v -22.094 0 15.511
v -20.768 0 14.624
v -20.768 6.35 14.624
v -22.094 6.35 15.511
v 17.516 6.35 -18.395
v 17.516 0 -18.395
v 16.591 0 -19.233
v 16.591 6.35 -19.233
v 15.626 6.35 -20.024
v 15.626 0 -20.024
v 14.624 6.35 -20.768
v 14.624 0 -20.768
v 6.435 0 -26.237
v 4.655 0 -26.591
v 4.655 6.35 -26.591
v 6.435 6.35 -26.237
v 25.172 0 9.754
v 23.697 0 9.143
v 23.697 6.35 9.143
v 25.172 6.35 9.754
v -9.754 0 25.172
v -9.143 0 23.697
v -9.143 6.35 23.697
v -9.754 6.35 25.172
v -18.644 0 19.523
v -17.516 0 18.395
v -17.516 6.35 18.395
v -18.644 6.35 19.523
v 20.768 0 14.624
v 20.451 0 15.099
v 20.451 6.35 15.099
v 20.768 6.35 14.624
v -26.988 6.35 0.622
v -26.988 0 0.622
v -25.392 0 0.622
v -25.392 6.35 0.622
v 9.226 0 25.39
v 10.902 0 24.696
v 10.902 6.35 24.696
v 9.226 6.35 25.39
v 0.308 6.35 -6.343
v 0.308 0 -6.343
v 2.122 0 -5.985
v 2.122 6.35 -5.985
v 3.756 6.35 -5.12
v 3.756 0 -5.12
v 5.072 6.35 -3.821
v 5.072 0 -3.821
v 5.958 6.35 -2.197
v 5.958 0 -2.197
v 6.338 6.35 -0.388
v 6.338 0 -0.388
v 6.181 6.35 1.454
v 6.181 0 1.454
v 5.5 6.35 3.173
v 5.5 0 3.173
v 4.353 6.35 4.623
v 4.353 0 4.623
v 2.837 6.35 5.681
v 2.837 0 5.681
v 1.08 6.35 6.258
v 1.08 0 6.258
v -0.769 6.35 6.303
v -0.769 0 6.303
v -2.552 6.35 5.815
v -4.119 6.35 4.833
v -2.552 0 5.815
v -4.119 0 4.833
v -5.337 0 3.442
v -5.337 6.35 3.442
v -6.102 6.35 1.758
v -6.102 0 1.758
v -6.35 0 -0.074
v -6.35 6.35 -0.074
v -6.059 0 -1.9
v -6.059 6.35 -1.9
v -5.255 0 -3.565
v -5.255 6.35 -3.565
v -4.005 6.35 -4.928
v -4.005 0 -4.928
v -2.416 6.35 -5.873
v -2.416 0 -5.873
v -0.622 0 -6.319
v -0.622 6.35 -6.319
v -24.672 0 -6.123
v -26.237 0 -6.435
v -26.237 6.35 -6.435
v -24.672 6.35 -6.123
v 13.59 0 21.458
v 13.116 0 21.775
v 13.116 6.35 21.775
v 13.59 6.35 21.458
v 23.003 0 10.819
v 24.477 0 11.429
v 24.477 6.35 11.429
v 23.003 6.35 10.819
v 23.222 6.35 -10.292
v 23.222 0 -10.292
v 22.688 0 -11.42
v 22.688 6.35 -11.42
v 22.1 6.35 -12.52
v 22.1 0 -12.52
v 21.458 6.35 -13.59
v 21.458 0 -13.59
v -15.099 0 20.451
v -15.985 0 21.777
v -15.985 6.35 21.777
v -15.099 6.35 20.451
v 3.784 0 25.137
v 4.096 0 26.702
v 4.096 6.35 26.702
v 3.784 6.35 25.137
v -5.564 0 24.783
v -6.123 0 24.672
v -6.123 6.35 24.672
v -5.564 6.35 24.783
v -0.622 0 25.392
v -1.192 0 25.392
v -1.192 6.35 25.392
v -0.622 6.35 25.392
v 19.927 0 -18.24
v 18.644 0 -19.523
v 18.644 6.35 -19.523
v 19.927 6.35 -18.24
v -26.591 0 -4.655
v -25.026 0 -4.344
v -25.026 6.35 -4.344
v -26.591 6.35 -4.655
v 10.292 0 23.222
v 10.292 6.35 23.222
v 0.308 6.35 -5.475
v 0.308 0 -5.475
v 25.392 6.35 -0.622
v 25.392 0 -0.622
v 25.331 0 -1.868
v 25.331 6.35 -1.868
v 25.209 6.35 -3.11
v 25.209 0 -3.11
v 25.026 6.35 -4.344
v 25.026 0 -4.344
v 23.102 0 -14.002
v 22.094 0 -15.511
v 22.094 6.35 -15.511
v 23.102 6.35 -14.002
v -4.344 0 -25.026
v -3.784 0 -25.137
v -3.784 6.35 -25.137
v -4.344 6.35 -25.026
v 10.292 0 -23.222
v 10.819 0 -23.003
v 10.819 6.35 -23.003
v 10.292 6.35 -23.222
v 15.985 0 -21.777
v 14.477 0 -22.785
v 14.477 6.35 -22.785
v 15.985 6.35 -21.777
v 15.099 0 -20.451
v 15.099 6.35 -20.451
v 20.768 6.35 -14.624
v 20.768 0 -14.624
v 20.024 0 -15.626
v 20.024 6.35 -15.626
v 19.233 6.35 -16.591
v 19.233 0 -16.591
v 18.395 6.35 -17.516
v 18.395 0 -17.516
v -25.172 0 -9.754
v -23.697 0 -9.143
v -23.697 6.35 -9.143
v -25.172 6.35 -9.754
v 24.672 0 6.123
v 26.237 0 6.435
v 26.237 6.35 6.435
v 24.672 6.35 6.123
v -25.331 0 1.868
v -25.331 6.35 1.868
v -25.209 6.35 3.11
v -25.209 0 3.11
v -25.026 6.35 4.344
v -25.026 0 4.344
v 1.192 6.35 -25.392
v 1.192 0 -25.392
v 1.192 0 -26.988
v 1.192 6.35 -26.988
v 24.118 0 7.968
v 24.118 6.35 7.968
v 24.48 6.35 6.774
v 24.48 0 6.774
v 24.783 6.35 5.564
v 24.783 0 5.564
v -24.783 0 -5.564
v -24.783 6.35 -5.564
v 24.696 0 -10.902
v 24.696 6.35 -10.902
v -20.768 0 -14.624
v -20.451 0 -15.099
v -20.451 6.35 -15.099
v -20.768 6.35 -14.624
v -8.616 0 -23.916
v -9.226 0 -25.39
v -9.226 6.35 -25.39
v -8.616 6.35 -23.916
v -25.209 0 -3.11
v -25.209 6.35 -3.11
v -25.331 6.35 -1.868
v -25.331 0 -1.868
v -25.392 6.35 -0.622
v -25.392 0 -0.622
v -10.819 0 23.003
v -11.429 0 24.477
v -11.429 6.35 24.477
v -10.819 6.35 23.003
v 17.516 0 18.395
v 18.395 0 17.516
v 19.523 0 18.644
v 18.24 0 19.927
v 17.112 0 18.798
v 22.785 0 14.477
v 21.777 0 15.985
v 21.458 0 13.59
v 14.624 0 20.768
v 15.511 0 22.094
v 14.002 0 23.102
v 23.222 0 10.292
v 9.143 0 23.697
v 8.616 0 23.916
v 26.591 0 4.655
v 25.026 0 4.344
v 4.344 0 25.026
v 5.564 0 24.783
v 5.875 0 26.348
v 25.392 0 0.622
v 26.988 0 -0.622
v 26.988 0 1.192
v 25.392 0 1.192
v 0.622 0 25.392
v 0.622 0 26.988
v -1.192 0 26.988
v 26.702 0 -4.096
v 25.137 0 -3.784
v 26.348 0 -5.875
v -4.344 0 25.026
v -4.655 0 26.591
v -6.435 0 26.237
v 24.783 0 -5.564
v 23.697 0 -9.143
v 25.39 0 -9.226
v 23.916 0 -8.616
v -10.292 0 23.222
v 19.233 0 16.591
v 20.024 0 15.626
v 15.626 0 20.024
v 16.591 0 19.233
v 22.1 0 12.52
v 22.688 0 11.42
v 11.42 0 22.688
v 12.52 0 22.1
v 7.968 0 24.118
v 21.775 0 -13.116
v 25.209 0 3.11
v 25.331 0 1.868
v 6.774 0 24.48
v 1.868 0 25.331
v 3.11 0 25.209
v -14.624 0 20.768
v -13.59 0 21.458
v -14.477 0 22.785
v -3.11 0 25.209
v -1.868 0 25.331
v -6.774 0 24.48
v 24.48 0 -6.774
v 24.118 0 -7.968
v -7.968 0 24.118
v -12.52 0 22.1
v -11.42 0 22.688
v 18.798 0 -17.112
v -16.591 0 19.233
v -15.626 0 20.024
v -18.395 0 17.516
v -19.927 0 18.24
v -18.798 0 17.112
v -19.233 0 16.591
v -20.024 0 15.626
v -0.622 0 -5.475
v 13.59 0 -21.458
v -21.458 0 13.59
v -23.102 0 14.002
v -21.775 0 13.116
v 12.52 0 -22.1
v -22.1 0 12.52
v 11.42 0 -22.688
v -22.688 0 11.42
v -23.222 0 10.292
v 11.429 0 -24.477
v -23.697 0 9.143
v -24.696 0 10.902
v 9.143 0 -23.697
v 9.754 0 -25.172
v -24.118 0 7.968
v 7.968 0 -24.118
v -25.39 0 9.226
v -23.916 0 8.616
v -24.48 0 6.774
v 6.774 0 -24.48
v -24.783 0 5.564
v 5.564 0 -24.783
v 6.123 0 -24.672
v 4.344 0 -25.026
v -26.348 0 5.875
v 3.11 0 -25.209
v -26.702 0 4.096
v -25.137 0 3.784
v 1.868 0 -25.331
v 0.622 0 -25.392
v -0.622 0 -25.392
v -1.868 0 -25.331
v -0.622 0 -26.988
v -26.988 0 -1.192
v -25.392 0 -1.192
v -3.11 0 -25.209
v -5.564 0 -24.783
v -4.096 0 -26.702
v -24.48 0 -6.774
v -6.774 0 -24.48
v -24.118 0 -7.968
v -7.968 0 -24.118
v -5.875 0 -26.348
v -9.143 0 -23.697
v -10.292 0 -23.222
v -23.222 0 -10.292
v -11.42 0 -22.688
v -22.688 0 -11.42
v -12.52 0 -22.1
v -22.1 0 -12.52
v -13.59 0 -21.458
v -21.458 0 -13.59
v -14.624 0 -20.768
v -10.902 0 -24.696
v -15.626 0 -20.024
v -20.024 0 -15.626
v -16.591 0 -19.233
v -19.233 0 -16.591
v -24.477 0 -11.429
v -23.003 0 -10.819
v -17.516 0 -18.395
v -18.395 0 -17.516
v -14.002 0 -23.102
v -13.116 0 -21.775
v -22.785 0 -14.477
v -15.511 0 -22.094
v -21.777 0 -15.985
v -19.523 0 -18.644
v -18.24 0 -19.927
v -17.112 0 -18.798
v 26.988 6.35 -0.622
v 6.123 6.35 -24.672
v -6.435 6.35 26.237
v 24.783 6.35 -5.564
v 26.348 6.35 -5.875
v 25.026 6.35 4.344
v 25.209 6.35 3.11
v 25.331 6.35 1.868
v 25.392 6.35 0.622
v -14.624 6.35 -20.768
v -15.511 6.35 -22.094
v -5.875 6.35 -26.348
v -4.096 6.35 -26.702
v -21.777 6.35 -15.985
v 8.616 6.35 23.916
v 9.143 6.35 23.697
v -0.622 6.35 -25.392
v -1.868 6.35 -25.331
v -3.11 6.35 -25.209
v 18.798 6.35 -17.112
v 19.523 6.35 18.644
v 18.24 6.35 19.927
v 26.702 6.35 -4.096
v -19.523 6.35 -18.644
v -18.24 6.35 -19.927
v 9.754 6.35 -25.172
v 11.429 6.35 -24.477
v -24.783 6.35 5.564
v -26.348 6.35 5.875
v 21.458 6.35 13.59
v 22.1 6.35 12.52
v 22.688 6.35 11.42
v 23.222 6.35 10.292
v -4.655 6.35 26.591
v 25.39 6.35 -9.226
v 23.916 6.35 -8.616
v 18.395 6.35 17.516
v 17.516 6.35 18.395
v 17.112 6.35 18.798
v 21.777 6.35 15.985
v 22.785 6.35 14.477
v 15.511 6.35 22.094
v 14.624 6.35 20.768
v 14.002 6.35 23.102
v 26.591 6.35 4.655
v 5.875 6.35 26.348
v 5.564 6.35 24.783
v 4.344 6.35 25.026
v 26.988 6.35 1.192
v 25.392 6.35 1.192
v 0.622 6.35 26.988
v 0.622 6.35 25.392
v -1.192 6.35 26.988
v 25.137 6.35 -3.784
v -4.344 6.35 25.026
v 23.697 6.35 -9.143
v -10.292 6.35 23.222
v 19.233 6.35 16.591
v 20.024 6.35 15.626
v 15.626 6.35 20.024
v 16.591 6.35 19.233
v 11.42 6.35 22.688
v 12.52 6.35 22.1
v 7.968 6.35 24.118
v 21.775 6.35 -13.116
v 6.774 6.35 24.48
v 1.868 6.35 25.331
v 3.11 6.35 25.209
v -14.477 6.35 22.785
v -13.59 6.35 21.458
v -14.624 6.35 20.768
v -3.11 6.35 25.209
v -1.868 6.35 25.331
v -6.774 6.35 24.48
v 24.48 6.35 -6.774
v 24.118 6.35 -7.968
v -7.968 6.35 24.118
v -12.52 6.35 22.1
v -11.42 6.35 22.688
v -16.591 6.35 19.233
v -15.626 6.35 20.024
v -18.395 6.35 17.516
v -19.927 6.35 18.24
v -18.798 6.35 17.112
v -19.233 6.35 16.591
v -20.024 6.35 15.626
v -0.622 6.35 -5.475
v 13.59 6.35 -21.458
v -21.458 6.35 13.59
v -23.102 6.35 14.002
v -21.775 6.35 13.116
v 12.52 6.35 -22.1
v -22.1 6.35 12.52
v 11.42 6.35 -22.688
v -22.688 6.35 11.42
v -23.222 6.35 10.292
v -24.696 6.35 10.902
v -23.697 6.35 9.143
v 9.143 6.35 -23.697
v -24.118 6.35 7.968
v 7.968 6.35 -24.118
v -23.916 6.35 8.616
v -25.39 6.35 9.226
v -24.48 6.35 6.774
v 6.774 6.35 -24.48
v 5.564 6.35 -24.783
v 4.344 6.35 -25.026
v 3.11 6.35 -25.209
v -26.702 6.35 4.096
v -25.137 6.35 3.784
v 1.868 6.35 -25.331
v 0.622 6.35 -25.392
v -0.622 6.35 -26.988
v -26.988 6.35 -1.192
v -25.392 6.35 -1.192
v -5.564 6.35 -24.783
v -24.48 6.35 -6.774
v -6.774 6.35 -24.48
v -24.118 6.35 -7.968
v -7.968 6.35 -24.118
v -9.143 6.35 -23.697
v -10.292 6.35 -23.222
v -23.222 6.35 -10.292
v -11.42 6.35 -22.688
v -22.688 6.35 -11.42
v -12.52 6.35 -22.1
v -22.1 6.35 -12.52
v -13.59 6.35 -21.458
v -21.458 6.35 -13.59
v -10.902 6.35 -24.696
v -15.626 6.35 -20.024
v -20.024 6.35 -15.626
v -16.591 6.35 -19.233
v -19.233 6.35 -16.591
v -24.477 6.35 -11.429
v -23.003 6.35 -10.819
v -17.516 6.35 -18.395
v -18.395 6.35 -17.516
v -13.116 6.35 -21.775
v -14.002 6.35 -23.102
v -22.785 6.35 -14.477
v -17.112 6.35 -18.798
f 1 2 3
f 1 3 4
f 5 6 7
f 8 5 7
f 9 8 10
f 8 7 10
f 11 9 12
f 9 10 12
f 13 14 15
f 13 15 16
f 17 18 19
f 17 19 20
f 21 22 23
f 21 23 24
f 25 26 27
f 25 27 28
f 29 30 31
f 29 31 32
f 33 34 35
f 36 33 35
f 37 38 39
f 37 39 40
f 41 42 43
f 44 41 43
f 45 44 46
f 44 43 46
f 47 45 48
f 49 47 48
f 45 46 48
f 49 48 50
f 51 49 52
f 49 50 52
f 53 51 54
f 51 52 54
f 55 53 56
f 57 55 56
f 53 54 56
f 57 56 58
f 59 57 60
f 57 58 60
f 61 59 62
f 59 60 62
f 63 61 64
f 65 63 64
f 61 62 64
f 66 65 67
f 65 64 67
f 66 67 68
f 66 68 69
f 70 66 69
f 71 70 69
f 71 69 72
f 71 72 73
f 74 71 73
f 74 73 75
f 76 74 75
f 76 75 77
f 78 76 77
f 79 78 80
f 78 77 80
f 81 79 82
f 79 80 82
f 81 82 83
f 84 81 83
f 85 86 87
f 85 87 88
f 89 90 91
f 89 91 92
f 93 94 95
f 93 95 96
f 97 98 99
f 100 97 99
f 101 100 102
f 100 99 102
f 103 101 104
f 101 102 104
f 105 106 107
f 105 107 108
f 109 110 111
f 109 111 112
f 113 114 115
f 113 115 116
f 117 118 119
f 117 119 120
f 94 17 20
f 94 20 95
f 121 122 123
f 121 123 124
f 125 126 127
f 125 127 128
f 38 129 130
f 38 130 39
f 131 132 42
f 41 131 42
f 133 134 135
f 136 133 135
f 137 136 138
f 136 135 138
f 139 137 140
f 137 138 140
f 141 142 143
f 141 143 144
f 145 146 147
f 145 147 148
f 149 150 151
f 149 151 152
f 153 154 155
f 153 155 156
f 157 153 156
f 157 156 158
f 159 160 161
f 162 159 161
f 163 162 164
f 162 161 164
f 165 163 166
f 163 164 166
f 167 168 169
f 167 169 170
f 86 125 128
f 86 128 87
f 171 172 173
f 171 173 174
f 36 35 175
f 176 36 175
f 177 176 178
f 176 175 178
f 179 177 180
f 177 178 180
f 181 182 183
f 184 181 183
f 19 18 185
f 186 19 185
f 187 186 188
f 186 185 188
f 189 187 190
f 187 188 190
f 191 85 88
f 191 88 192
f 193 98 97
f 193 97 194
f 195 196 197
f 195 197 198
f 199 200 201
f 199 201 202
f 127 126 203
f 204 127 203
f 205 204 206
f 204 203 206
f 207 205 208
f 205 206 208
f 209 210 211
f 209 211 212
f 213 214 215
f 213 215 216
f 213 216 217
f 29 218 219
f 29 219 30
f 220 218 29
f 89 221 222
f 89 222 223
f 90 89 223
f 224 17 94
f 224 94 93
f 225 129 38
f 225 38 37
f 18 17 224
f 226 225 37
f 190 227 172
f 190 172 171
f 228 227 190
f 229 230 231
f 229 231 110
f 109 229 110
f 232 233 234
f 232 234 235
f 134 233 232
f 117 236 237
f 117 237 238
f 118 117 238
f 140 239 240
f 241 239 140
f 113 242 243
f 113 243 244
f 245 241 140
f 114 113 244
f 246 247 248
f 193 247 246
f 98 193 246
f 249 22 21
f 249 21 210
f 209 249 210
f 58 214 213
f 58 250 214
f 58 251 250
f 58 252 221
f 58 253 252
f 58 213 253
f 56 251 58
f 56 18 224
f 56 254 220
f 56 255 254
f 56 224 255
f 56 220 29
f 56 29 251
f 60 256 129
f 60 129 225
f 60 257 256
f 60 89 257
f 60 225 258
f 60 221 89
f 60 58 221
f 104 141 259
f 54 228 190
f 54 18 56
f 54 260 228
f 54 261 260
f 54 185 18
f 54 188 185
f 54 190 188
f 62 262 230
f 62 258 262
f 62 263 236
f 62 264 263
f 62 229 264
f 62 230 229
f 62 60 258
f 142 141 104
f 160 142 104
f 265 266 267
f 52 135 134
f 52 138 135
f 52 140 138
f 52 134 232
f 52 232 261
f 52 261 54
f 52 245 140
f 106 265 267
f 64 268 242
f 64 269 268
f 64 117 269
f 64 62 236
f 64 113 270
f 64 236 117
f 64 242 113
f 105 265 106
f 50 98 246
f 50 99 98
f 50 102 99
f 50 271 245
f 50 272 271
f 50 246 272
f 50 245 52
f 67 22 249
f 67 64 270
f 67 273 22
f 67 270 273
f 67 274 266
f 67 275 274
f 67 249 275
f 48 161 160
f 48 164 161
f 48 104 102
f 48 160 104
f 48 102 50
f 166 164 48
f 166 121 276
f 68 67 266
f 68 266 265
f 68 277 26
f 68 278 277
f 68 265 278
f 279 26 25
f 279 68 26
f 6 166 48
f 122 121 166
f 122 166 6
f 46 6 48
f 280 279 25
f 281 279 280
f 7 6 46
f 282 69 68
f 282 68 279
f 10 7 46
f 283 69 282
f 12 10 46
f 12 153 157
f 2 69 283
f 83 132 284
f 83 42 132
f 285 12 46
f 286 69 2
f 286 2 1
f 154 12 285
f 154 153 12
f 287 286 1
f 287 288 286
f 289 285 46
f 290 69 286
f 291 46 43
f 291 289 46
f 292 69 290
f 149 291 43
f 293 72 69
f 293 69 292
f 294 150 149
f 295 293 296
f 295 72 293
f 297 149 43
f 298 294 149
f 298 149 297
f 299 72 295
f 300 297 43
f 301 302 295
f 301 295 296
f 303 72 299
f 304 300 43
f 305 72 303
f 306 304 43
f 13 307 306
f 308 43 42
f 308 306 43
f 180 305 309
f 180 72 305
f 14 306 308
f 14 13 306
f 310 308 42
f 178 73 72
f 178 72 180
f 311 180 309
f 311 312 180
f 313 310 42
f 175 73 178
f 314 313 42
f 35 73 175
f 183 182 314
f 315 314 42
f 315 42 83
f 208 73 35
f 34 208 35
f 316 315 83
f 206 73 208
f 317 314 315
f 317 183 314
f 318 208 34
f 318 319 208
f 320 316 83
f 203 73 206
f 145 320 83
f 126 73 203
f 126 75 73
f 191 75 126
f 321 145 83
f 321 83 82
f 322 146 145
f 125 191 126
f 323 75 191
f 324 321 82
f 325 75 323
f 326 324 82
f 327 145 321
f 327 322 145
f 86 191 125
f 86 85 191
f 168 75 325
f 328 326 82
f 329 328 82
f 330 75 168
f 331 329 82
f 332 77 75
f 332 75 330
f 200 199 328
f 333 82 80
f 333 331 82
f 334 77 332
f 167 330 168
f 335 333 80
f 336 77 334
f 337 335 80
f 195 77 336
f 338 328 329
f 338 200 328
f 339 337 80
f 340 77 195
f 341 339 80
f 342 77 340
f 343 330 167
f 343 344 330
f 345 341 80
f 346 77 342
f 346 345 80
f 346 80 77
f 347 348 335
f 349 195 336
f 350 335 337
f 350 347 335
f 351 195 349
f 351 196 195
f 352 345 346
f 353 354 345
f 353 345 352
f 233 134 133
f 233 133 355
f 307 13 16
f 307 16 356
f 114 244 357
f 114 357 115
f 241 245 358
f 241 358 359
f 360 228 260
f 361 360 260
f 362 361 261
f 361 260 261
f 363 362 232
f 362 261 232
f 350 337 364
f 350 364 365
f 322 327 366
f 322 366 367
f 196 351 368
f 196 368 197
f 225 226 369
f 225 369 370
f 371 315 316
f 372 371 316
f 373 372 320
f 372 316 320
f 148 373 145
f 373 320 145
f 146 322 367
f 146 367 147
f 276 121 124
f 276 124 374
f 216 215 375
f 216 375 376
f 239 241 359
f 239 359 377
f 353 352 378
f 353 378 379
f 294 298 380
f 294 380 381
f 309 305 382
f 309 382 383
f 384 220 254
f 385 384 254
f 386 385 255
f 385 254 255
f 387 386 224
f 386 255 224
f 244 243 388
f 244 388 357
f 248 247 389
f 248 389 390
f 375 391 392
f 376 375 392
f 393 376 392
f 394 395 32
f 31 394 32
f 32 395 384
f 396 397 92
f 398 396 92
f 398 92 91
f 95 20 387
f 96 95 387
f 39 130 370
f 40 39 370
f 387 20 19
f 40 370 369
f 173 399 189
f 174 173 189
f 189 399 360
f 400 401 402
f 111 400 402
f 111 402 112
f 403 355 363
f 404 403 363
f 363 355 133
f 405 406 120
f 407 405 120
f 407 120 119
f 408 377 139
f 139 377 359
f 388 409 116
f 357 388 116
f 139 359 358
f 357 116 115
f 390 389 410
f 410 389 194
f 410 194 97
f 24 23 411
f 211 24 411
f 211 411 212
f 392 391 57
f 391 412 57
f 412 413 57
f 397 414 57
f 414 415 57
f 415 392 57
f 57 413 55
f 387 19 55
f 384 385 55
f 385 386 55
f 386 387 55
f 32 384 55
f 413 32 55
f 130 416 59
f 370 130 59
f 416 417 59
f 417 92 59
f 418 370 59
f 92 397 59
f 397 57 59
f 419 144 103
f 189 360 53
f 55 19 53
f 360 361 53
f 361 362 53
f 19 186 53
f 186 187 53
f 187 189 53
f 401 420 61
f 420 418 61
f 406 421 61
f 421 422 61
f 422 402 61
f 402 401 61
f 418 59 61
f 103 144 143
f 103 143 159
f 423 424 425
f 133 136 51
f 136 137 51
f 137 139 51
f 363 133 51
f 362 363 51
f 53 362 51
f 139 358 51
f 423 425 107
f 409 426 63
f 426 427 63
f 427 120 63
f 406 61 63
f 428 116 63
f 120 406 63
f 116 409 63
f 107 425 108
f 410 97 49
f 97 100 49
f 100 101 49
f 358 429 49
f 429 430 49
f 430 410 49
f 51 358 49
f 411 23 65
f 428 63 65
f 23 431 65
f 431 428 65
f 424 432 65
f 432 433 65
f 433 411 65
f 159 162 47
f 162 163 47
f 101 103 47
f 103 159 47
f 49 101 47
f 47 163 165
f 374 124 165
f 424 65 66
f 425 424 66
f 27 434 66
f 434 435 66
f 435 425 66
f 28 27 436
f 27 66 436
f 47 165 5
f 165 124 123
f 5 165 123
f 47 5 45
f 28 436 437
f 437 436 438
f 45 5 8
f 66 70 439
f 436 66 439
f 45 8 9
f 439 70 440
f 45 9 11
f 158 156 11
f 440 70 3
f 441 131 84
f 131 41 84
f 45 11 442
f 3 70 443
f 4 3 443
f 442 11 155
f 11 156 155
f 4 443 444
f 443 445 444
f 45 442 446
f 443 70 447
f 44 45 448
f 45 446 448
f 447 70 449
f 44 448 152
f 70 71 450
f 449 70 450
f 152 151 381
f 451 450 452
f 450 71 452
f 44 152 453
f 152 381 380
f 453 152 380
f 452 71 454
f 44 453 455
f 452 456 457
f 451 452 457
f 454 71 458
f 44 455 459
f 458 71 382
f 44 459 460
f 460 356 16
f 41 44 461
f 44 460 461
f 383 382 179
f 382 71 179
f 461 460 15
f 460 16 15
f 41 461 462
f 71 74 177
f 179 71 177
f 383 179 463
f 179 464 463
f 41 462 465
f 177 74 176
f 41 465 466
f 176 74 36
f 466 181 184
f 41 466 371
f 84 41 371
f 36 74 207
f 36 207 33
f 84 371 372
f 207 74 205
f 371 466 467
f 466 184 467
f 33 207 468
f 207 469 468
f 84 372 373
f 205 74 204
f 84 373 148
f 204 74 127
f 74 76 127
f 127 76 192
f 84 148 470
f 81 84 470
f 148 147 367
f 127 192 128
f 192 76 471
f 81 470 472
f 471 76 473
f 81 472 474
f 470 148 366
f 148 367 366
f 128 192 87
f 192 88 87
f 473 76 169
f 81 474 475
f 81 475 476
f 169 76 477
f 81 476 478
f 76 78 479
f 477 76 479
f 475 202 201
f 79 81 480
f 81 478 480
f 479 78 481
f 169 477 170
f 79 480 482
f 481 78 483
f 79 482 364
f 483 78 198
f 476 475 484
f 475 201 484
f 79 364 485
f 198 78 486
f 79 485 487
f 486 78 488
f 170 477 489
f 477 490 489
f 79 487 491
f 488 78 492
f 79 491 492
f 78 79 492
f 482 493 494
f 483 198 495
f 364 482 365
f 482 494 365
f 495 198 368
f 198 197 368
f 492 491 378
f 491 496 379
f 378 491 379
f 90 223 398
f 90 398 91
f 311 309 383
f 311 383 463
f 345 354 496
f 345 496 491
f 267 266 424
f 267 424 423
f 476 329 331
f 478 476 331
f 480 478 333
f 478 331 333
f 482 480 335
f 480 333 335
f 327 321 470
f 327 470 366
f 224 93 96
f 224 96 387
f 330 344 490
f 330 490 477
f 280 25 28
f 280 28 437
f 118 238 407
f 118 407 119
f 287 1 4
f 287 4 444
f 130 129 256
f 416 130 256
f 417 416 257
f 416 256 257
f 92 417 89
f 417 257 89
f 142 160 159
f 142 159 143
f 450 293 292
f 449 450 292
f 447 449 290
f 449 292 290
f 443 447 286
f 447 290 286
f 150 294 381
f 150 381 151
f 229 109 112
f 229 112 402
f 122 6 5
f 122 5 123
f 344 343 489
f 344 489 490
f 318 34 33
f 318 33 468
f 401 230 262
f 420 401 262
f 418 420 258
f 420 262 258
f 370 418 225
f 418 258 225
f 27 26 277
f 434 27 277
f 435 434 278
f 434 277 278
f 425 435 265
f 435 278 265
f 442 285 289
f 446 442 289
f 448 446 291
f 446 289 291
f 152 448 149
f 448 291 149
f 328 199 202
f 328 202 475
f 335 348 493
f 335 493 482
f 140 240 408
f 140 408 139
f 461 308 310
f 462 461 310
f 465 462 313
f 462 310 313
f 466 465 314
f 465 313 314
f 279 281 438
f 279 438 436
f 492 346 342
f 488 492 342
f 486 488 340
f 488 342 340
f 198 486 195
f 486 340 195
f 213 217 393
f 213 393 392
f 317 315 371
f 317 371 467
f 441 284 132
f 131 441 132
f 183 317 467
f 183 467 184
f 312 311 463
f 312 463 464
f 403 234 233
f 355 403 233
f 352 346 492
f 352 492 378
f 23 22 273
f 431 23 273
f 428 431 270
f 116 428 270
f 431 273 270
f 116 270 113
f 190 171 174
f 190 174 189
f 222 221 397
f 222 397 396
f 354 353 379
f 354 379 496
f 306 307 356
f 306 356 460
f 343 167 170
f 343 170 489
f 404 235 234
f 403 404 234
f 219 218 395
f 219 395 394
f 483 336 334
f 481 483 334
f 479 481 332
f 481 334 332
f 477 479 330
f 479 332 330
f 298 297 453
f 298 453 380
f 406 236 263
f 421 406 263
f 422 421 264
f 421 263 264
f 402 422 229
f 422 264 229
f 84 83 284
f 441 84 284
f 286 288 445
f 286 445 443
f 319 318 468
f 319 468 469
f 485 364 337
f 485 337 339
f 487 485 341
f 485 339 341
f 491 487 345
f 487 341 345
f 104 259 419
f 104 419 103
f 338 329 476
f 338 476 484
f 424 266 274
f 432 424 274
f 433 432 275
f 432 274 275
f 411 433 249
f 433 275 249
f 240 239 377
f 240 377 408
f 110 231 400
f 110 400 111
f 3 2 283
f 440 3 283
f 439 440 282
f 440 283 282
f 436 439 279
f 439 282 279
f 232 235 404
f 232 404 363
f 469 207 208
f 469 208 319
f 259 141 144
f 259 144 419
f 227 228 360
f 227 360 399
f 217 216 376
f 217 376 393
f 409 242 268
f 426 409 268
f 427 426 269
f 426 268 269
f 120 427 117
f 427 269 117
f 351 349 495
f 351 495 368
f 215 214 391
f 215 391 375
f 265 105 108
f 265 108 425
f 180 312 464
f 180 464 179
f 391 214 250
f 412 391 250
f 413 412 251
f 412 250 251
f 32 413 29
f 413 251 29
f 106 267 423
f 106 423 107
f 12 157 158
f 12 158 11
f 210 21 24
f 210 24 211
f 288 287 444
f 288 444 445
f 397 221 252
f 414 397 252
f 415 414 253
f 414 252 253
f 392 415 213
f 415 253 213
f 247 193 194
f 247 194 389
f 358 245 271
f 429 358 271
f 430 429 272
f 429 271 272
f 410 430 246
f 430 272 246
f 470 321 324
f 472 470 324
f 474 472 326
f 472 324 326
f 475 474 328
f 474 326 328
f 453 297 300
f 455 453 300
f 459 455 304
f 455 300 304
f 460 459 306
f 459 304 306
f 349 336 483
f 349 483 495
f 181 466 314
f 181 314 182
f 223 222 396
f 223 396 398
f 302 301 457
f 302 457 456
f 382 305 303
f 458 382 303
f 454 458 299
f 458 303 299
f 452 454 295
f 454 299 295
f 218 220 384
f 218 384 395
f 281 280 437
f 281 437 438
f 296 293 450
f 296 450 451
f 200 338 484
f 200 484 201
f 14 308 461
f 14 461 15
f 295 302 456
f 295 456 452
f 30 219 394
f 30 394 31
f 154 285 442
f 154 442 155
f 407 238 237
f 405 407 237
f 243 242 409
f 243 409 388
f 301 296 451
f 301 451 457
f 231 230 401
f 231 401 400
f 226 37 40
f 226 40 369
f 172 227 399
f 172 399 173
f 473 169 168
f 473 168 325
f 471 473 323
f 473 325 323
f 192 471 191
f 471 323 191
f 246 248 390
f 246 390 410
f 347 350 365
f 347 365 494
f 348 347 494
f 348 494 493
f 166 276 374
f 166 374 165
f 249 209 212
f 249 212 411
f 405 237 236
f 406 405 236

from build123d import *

# Parameters (mm, degrees)
SKETCH1_R           = 25.4
SKETCH1_W           = 1.814083278
SKETCH1_H           = 1.595577256
SKETCH1_W_2         = 1.595577256
SKETCH1_H_2         = 1.814083278
BOSS_EXTRUDE1_DEPTH = 6.35


with BuildPart() as part:
    # Sketch1 → Boss-Extrude1 (new body)
    # profile 1 of 33: a face of its own
    with BuildSketch(Plane(origin=(0, 0, 0), x_dir=(1, 0, 0), z_dir=(0, 1, 0))):
        Circle(SKETCH1_R)
        with BuildLine():
            Line((-0.62166438, 6.319496293), (-0.62166438, 5.475030088))
            Line((-0.62166438, 5.475030088), (0.308287629, 5.475030088))
            Line((0.308287629, 5.475030088), (0.308287629, 6.342512021))
            ThreePointArc((0.308287629, 6.342512021), (0.1571104, -6.348056106), (-0.62166438, 6.319496293))
        make_face(mode=Mode.SUBTRACT)
    # profile 2 of 33: a face of its own
    with BuildSketch(Plane(origin=(0, 0, 0), x_dir=(1, 0, 0), z_dir=(0, 1, 0))):
        Polygon((4.655372194, 26.590682963), (6.434598369, 26.236772872), (6.123316689, 24.671854186), (4.344090513, 25.025764276), align=None)
    # profile 3 of 33: a face of its own
    with BuildSketch(Plane(origin=(0, 0, 0), x_dir=(1, 0, 0), z_dir=(0, 1, 0))):
        with Locations((0.285377259, 26.190179878)):
            Rectangle(SKETCH1_W, SKETCH1_H)
    # profile 4 of 33: a face of its own
    with BuildSketch(Plane(origin=(0, 0, 0), x_dir=(1, 0, 0), z_dir=(0, 1, 0))):
        Polygon((9.753505424, 25.171532385), (11.429499834, 24.47731277), (10.818898853, 23.003191601), (9.142904443, 23.697411216), align=None)
    # profile 5 of 33: a face of its own
    with BuildSketch(Plane(origin=(0, 0, 0), x_dir=(1, 0, 0), z_dir=(0, 1, 0))):
        Polygon((14.476816911, 22.785053935), (15.98517203, 21.777203266), (15.098716802, 20.450529263), (13.590361683, 21.458379932), align=None)
    # profile 6 of 33: a face of its own
    with BuildSketch(Plane(origin=(0, 0, 0), x_dir=(1, 0, 0), z_dir=(0, 1, 0))):
        Polygon((18.643792443, 19.52295864), (19.92654303, 18.240208053), (18.798299532, 17.111964555), (17.515548945, 18.394715142), align=None)
    # profile 7 of 33: a face of its own
    with BuildSketch(Plane(origin=(0, 0, 0), x_dir=(1, 0, 0), z_dir=(0, 1, 0))):
        Polygon((22.094297486, 15.510606992), (23.102148155, 14.002251873), (21.775474153, 13.115796645), (20.767623484, 14.624151764), align=None)
    # profile 8 of 33: a face of its own
    with BuildSketch(Plane(origin=(0, 0, 0), x_dir=(1, 0, 0), z_dir=(0, 1, 0))):
        Polygon((24.695731068, 10.902191417), (25.389950683, 9.226197007), (23.915829514, 8.615596026), (23.221609899, 10.291590436), align=None)
    # profile 9 of 33: a face of its own
    with BuildSketch(Plane(origin=(0, 0, 0), x_dir=(1, 0, 0), z_dir=(0, 1, 0))):
        Polygon((26.348121555, 5.874810739), (26.702031645, 4.095584564), (25.137112959, 3.784302883), (24.783202868, 5.563529059), align=None)
    # profile 10 of 33: a face of its own
    with BuildSketch(Plane(origin=(0, 0, 0), x_dir=(1, 0, 0), z_dir=(0, 1, 0))):
        with Locations((26.190179878, -0.285377259)):
            Rectangle(SKETCH1_W_2, SKETCH1_H_2)
    # profile 11 of 33: a face of its own
    with BuildSketch(Plane(origin=(0, 0, 0), x_dir=(1, 0, 0), z_dir=(0, 1, 0))):
        Polygon((26.590682963, -4.655372194), (26.236772872, -6.434598369), (24.671854186, -6.123316689), (25.025764276, -4.344090513), align=None)
    # profile 12 of 33: a face of its own
    with BuildSketch(Plane(origin=(0, 0, 0), x_dir=(1, 0, 0), z_dir=(0, 1, 0))):
        Polygon((25.171532385, -9.753505424), (24.47731277, -11.429499834), (23.003191601, -10.818898853), (23.697411216, -9.142904443), align=None)
    # profile 13 of 33: a face of its own
    with BuildSketch(Plane(origin=(0, 0, 0), x_dir=(1, 0, 0), z_dir=(0, 1, 0))):
        Polygon((22.785053935, -14.476816911), (21.777203266, -15.98517203), (20.450529263, -15.098716802), (21.458379932, -13.590361683), align=None)
    # profile 14 of 33: a face of its own
    with BuildSketch(Plane(origin=(0, 0, 0), x_dir=(1, 0, 0), z_dir=(0, 1, 0))):
        Polygon((19.52295864, -18.643792443), (18.240208053, -19.92654303), (17.111964555, -18.798299532), (18.394715142, -17.515548945), align=None)
    # profile 15 of 33: a face of its own
    with BuildSketch(Plane(origin=(0, 0, 0), x_dir=(1, 0, 0), z_dir=(0, 1, 0))):
        Polygon((15.510606992, -22.094297486), (14.002251873, -23.102148155), (13.115796645, -21.775474153), (14.624151764, -20.767623484), align=None)
    # profile 16 of 33: a face of its own
    with BuildSketch(Plane(origin=(0, 0, 0), x_dir=(1, 0, 0), z_dir=(0, 1, 0))):
        Polygon((10.902191417, -24.695731068), (9.226197007, -25.389950683), (8.615596026, -23.915829514), (10.291590436, -23.221609899), align=None)
    # profile 17 of 33: a face of its own
    with BuildSketch(Plane(origin=(0, 0, 0), x_dir=(1, 0, 0), z_dir=(0, 1, 0))):
        Polygon((5.874810739, -26.348121555), (4.095584564, -26.702031645), (3.784302883, -25.137112959), (5.563529059, -24.783202868), align=None)
    # profile 18 of 33: a face of its own
    with BuildSketch(Plane(origin=(0, 0, 0), x_dir=(1, 0, 0), z_dir=(0, 1, 0))):
        with Locations((-0.285377259, -26.190179878)):
            Rectangle(SKETCH1_W, SKETCH1_H)
    # profile 19 of 33: a face of its own
    with BuildSketch(Plane(origin=(0, 0, 0), x_dir=(1, 0, 0), z_dir=(0, 1, 0))):
        Polygon((-4.655372194, -26.590682963), (-6.434598369, -26.236772872), (-6.123316689, -24.671854186), (-4.344090513, -25.025764276), align=None)
    # profile 20 of 33: a face of its own
    with BuildSketch(Plane(origin=(0, 0, 0), x_dir=(1, 0, 0), z_dir=(0, 1, 0))):
        Polygon((-9.753505424, -25.171532385), (-11.429499834, -24.47731277), (-10.818898853, -23.003191601), (-9.142904443, -23.697411216), align=None)
    # profile 21 of 33: a face of its own
    with BuildSketch(Plane(origin=(0, 0, 0), x_dir=(1, 0, 0), z_dir=(0, 1, 0))):
        Polygon((-14.476816911, -22.785053935), (-15.98517203, -21.777203266), (-15.098716802, -20.450529263), (-13.590361683, -21.458379932), align=None)
    # profile 22 of 33: a face of its own
    with BuildSketch(Plane(origin=(0, 0, 0), x_dir=(1, 0, 0), z_dir=(0, 1, 0))):
        Polygon((-18.643792443, -19.52295864), (-19.92654303, -18.240208053), (-18.798299532, -17.111964555), (-17.515548945, -18.394715142), align=None)
    # profile 23 of 33: a face of its own
    with BuildSketch(Plane(origin=(0, 0, 0), x_dir=(1, 0, 0), z_dir=(0, 1, 0))):
        Polygon((-22.094297486, -15.510606992), (-23.102148155, -14.002251873), (-21.775474153, -13.115796645), (-20.767623484, -14.624151764), align=None)
    # profile 24 of 33: a face of its own
    with BuildSketch(Plane(origin=(0, 0, 0), x_dir=(1, 0, 0), z_dir=(0, 1, 0))):
        Polygon((-24.695731068, -10.902191417), (-25.389950683, -9.226197007), (-23.915829514, -8.615596026), (-23.221609899, -10.291590436), align=None)
    # profile 25 of 33: a face of its own
    with BuildSketch(Plane(origin=(0, 0, 0), x_dir=(1, 0, 0), z_dir=(0, 1, 0))):
        Polygon((-26.348121555, -5.874810739), (-26.702031645, -4.095584564), (-25.137112959, -3.784302883), (-24.783202868, -5.563529059), align=None)
    # profile 26 of 33: a face of its own
    with BuildSketch(Plane(origin=(0, 0, 0), x_dir=(1, 0, 0), z_dir=(0, 1, 0))):
        with Locations((-26.190179878, 0.285377259)):
            Rectangle(SKETCH1_W_2, SKETCH1_H_2)
    # profile 27 of 33: a face of its own
    with BuildSketch(Plane(origin=(0, 0, 0), x_dir=(1, 0, 0), z_dir=(0, 1, 0))):
        Polygon((-26.590682963, 4.655372194), (-26.236772872, 6.434598369), (-24.671854186, 6.123316689), (-25.025764276, 4.344090513), align=None)
    # profile 28 of 33: a face of its own
    with BuildSketch(Plane(origin=(0, 0, 0), x_dir=(1, 0, 0), z_dir=(0, 1, 0))):
        Polygon((-25.171532385, 9.753505424), (-24.47731277, 11.429499834), (-23.003191601, 10.818898853), (-23.697411216, 9.142904443), align=None)
    # profile 29 of 33: a face of its own
    with BuildSketch(Plane(origin=(0, 0, 0), x_dir=(1, 0, 0), z_dir=(0, 1, 0))):
        Polygon((-22.785053935, 14.476816911), (-21.777203266, 15.98517203), (-20.450529263, 15.098716802), (-21.458379932, 13.590361683), align=None)
    # profile 30 of 33: a face of its own
    with BuildSketch(Plane(origin=(0, 0, 0), x_dir=(1, 0, 0), z_dir=(0, 1, 0))):
        Polygon((-19.52295864, 18.643792443), (-18.240208053, 19.92654303), (-17.111964555, 18.798299532), (-18.394715142, 17.515548945), align=None)
    # profile 31 of 33: a face of its own
    with BuildSketch(Plane(origin=(0, 0, 0), x_dir=(1, 0, 0), z_dir=(0, 1, 0))):
        Polygon((-15.510606992, 22.094297486), (-14.002251873, 23.102148155), (-13.115796645, 21.775474153), (-14.624151764, 20.767623484), align=None)
    # profile 32 of 33: a face of its own
    with BuildSketch(Plane(origin=(0, 0, 0), x_dir=(1, 0, 0), z_dir=(0, 1, 0))):
        Polygon((-10.902191417, 24.695731068), (-9.226197007, 25.389950683), (-8.615596026, 23.915829514), (-10.291590436, 23.221609899), align=None)
    # profile 33 of 33: a face of its own
    with BuildSketch(Plane(origin=(0, 0, 0), x_dir=(1, 0, 0), z_dir=(0, 1, 0))):
        Polygon((-5.874810739, 26.348121555), (-4.095584564, 26.702031645), (-3.784302883, 25.137112959), (-5.563529059, 24.783202868), align=None)
    extrude(amount=BOSS_EXTRUDE1_DEPTH)


solid = part.part
